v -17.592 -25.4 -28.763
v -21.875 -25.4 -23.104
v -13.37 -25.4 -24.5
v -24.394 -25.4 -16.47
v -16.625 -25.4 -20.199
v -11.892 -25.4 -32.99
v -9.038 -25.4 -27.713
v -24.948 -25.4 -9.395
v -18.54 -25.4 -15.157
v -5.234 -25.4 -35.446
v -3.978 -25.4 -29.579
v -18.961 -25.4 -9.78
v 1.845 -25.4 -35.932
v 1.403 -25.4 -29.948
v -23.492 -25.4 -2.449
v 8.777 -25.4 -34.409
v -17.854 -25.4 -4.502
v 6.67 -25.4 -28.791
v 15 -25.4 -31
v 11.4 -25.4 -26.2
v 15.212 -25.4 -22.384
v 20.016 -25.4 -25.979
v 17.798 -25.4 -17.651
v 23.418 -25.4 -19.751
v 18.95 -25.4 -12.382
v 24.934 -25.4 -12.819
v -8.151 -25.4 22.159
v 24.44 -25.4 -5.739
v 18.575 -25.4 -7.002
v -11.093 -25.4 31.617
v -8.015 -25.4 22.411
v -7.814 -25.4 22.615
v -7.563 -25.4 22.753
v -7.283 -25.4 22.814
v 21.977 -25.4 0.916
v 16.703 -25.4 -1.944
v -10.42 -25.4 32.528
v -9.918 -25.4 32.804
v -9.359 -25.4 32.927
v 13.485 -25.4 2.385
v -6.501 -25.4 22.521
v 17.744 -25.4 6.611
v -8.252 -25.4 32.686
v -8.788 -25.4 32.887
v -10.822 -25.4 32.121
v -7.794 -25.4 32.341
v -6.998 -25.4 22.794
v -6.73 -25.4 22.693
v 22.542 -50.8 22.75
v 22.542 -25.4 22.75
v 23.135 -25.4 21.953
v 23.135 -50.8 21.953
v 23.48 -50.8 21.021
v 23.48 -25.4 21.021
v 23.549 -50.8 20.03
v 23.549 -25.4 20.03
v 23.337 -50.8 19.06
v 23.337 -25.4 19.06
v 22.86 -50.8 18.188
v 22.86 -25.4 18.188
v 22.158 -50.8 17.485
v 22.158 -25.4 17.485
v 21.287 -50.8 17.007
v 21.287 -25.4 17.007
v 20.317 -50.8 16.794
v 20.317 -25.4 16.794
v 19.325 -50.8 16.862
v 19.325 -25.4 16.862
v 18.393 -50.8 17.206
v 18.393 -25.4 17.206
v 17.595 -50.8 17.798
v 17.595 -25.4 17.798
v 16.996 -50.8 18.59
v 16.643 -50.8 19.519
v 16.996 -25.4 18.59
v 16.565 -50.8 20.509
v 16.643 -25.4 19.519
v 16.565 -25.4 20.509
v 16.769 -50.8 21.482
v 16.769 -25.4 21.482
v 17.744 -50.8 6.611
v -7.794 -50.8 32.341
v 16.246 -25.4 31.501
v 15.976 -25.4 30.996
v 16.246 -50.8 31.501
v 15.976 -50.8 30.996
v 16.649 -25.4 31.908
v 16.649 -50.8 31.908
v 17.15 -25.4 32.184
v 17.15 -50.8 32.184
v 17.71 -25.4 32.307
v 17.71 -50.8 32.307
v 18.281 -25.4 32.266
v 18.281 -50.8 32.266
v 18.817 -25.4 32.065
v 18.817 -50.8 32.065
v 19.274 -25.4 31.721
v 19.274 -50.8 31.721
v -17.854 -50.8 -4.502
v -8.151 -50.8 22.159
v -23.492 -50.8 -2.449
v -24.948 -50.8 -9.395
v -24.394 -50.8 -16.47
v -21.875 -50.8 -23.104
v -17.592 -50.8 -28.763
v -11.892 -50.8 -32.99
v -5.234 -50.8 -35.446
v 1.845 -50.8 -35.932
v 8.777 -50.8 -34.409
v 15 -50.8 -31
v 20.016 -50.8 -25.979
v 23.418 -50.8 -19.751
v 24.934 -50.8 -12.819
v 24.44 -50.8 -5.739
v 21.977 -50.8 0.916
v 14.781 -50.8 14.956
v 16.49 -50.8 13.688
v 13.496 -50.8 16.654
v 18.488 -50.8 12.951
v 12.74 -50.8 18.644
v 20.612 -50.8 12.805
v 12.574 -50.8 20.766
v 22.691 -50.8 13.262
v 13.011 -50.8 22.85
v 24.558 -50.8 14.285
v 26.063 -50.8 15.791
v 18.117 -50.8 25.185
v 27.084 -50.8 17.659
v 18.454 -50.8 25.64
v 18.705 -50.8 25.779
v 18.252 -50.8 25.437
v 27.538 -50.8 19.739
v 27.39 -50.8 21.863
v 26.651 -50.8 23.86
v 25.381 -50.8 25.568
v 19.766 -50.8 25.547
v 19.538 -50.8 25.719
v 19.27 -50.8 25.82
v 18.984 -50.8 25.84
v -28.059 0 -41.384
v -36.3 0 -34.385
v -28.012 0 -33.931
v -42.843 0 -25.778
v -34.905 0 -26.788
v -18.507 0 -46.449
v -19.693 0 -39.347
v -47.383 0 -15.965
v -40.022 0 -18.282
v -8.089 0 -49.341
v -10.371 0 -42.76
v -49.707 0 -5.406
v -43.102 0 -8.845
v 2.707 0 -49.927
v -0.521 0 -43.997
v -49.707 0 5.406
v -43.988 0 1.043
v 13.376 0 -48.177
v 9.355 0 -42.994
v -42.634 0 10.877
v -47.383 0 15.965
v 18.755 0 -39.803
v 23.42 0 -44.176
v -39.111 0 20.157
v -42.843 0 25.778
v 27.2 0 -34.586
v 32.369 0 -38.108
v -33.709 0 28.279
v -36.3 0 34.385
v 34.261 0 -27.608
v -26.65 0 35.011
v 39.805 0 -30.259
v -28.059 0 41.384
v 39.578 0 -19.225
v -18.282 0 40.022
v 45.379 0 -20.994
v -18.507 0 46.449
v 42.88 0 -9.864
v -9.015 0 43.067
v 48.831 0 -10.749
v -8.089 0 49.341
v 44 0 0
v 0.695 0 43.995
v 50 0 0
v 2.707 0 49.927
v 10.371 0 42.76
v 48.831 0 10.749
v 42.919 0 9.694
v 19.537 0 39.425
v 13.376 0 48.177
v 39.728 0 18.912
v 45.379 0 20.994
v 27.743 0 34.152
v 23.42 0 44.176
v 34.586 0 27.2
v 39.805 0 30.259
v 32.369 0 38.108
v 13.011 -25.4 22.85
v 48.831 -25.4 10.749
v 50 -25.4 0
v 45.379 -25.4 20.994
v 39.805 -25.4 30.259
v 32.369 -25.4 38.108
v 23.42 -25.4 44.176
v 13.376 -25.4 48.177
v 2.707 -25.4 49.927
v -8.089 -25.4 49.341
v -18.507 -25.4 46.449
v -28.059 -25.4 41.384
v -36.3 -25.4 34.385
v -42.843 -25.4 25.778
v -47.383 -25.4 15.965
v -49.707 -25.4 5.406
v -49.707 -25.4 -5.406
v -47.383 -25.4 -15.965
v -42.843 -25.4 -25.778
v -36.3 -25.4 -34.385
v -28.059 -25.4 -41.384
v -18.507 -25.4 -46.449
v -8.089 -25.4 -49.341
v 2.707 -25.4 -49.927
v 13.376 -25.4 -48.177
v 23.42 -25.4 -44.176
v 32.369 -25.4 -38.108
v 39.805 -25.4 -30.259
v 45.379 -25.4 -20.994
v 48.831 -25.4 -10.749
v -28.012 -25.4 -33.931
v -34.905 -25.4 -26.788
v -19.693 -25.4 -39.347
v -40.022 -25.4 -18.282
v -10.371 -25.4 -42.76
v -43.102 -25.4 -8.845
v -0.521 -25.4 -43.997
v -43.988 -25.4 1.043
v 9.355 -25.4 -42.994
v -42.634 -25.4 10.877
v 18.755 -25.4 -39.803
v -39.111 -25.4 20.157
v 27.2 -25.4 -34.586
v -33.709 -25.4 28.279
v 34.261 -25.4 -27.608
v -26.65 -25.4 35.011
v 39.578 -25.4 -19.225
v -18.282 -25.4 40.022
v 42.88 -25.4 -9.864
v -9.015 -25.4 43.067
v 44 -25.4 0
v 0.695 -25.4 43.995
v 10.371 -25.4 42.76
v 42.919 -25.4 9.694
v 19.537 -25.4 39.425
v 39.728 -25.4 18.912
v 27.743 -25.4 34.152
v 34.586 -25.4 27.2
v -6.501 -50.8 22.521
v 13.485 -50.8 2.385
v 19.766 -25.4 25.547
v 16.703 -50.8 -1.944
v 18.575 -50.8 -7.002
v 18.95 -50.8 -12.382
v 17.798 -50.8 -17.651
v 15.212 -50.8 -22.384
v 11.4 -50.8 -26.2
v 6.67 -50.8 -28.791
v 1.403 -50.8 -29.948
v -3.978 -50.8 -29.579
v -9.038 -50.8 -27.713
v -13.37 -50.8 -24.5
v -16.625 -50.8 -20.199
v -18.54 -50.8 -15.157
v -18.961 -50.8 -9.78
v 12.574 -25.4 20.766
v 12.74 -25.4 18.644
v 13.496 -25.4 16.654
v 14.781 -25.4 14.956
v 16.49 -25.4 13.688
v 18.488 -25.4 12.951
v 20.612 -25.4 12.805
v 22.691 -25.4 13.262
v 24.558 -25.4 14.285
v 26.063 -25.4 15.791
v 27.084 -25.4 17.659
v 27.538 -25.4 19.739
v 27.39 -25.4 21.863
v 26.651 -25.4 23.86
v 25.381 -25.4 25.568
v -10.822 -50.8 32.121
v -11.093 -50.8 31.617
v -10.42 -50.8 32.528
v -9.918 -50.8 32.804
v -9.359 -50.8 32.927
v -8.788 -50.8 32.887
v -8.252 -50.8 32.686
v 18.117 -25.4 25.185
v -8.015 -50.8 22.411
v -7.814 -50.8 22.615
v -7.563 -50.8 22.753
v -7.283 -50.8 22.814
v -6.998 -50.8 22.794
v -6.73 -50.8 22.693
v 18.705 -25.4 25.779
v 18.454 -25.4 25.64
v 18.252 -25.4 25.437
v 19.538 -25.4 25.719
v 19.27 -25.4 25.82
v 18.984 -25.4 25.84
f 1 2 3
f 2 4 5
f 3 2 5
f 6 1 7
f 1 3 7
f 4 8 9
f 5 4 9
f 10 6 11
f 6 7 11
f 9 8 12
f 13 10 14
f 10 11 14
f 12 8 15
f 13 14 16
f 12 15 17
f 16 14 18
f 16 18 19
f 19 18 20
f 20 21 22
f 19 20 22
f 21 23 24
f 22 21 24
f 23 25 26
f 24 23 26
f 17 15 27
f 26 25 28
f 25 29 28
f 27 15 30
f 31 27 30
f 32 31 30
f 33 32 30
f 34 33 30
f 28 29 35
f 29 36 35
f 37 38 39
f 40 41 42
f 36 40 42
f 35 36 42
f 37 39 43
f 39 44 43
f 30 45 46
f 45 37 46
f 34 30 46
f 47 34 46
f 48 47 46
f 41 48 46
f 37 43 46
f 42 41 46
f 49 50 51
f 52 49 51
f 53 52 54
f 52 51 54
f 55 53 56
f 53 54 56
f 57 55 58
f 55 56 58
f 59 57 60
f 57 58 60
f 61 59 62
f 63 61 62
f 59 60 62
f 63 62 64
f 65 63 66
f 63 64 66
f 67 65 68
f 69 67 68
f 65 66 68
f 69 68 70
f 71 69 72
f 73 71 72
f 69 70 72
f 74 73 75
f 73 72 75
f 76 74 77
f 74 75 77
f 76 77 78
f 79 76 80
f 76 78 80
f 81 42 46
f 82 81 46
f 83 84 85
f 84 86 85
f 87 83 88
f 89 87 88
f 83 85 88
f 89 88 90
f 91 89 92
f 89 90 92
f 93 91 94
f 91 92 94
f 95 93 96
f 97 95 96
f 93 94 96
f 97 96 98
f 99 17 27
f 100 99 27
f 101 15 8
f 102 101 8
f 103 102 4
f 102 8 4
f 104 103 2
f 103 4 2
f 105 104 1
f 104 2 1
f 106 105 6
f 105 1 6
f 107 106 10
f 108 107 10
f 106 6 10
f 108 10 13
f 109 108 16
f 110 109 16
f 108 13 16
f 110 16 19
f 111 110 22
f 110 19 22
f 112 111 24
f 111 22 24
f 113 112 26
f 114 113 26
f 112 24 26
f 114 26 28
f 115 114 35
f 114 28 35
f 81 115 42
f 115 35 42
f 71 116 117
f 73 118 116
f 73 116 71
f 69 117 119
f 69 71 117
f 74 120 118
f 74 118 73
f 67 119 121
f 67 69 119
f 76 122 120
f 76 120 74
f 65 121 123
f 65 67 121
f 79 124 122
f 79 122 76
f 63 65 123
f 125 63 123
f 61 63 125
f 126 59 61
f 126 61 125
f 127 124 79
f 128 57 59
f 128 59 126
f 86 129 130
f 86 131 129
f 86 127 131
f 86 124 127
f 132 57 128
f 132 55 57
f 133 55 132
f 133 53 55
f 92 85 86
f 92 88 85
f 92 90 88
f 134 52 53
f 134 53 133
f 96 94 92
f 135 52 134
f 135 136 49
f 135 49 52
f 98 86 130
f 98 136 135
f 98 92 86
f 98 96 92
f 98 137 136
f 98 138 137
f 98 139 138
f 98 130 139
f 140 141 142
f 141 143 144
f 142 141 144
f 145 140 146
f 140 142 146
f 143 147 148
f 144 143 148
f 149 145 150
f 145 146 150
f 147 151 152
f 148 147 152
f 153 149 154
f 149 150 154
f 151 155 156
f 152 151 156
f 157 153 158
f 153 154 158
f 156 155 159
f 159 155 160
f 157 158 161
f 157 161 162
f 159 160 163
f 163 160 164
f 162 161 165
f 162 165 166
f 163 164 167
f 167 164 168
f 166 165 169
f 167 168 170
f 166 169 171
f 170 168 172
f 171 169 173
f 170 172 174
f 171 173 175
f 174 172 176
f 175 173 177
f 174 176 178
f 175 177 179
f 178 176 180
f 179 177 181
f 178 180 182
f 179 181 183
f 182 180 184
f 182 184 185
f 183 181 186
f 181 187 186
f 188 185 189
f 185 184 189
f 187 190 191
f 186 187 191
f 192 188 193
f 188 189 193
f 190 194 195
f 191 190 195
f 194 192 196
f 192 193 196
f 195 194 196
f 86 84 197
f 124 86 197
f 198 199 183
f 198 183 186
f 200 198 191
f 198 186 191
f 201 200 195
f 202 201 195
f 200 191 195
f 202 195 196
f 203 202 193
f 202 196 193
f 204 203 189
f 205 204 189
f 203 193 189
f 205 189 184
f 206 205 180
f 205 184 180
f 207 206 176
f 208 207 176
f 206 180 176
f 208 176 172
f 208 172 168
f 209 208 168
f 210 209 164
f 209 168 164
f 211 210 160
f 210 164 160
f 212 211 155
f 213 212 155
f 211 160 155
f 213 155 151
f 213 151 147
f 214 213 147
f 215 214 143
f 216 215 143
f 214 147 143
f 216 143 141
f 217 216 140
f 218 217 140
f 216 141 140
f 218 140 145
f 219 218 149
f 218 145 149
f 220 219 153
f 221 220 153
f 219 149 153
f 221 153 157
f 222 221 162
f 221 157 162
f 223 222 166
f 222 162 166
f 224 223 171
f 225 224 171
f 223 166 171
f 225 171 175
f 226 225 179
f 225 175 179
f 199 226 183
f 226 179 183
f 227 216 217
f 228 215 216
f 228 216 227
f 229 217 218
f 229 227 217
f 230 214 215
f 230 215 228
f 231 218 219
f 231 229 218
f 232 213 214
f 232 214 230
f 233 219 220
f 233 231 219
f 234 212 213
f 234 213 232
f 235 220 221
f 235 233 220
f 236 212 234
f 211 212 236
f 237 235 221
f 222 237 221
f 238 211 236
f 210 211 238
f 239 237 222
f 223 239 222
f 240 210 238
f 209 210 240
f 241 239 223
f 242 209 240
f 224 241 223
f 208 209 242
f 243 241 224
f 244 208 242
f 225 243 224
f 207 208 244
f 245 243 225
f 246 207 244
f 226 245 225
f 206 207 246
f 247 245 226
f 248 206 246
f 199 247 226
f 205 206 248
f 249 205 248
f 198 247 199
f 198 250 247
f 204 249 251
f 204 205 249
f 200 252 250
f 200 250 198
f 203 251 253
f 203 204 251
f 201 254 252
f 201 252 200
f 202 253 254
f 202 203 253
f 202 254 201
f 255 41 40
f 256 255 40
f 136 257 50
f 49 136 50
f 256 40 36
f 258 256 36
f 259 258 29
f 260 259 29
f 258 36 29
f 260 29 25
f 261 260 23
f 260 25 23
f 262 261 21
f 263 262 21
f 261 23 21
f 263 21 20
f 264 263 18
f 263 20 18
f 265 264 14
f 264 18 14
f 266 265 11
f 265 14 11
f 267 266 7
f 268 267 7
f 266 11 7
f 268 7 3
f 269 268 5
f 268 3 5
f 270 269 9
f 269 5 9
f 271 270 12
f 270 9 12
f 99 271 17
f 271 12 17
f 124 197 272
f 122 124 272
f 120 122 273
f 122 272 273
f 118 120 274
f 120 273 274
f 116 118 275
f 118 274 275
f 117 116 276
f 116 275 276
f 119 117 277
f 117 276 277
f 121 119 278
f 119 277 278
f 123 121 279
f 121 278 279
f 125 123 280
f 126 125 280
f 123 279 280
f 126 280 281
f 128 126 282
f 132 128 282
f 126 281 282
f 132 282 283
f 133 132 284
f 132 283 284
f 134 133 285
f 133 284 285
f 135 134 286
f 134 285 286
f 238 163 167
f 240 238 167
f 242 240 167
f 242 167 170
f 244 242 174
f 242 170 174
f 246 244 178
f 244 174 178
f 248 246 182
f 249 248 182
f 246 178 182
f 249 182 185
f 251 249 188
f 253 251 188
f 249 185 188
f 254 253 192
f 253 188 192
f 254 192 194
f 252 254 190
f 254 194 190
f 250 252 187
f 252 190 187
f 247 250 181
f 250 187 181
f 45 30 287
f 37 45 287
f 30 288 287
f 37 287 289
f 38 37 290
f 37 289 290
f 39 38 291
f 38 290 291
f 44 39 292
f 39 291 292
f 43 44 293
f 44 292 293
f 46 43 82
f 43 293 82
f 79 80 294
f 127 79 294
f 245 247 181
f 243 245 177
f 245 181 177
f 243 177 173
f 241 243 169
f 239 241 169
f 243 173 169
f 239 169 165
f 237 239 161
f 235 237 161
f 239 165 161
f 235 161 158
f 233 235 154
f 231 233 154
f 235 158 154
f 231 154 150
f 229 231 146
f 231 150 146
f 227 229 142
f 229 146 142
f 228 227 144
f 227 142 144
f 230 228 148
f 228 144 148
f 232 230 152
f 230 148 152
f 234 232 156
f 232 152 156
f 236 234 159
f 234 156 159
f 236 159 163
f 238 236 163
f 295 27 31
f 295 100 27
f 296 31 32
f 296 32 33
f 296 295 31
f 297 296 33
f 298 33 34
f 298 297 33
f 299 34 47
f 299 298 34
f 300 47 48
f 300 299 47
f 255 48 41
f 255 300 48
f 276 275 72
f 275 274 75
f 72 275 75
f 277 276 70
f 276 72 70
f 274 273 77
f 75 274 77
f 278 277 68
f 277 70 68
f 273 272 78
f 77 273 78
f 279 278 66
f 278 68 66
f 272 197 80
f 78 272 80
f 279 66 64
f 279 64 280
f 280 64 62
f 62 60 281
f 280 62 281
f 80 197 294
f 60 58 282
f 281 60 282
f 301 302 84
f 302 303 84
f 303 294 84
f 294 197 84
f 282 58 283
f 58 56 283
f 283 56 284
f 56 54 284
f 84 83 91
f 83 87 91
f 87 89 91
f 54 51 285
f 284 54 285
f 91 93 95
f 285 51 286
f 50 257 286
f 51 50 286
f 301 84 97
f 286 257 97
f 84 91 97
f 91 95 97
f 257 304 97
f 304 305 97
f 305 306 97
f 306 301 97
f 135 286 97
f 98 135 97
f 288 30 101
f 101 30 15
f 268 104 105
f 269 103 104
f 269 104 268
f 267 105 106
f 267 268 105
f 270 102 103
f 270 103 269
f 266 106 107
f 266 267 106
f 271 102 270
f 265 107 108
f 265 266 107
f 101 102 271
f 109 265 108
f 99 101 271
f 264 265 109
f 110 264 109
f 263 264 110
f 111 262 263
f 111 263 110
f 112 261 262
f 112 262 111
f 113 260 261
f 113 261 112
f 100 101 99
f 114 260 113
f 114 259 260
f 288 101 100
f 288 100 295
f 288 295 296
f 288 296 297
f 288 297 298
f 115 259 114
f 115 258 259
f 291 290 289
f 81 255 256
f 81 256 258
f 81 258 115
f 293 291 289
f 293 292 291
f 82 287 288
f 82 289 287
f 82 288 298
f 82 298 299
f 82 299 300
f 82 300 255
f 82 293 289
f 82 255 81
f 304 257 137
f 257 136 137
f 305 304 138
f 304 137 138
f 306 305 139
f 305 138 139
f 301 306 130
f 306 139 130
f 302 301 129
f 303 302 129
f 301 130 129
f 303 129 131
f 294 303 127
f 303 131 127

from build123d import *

# Parameters (mm, degrees)
F0_R      = 50
F1_DEPTH  = 25.4
F2_R      = 1
F3_R      = 2
F4_R      = 1
F5_R      = 2
F8_DEPTH  = 25.4
F9_R      = 1
F10_R     = 2
F11_R     = 4
F14_DEPTH = 25.4
F15_R     = 1
F15_2_R   = 1
F16_R     = 2
F16_2_R   = 2


with BuildPart() as f1:
    # F0 (on Front) → F1 (new body)
    with BuildSketch(Plane.XZ):
        Circle(F0_R)
        with BuildLine():
            ThreePointArc((-39.1111111111, 20.1574052808), (10.3708994574, 42.7603138955), (44, 0))
            ThreePointArc((44, 0), (-10.3708994574, -42.7603138955), (-39.1111111111, 20.1574052808))
        make_face(mode=Mode.SUBTRACT)
    extrude(amount=F1_DEPTH)


with BuildPart() as f1b:
    # F0 (on Front) → F1, piece 2 (new body)
    with BuildSketch(Plane.XZ):
        with BuildLine():
            ThreePointArc((0, 16.4924225025), (-16, 26.2462112512), (-32, 16.4924225025))
            Line((-32, 16.4924225025), (-30.2222222222, 15.5761768079))
            Line((-30.2222222222, 15.5761768079), (-34, 8.2462112512))
            ThreePointArc((-34, 8.2462112512), (-33.0849981905, 2.5802747153), (-30.4330181301, -2.5096238003))
            Line((-30.4330181301, -2.5096238003), (0, -43.3470204617))
            Line((0, -43.3470204617), (30.4330181301, -2.5096238003))
            ThreePointArc((30.4330181301, -2.5096238003), (25.5332732557, 23.5143709646), (0, 16.4924225025))
        make_face()
        with BuildLine():
            ThreePointArc((-28.829349449, -1.3145310168), (-31.9458736097, 6.9312531437), (-30.2222222222, 15.5761768079))
            ThreePointArc((-30.2222222222, 15.5761768079), (-12.2287638337, 23.7954163042), (0, 8.2462112512))
            ThreePointArc((0, 8.2462112512), (21.0363880319, 23.4328763095), (28.829349449, -1.3145310168))
            Line((28.829349449, -1.3145310168), (0, -40))
            Line((0, -40), (-28.829349449, -1.3145310168))
        make_face(mode=Mode.SUBTRACT)
        with BuildLine():
            Line((-30.2222222222, 15.5761768079), (-32, 16.4924225025))
            ThreePointArc((-32, 16.4924225025), (-33.4928556845, 12.4888519384), (-34, 8.2462112512))
            Line((-34, 8.2462112512), (-30.2222222222, 15.5761768079))
        make_face()
    extrude(amount=F1_DEPTH)

    # F2
    f2_edges = [f1b.edges().sort_by_distance(p)[0] for p in [
        (0, -12.7, 16.492423),
    ]]
    fillet(f2_edges, radius=F2_R)

    # F3
    f3_edges = [f1b.edges().sort_by_distance(p)[0] for p in [
        (0, -12.7, 8.246211),
    ]]
    fillet(f3_edges, radius=F3_R)

    # F4
    f4_edges = [f1b.edges().sort_by_distance(p)[0] for p in [
        (0, -12.7, -40),
    ]]
    fillet(f4_edges, radius=F4_R)

    # F5
    f5_edges = [f1b.edges().sort_by_distance(p)[0] for p in [
        (0, -12.7, -43.34702),
    ]]
    fillet(f5_edges, radius=F5_R)


with BuildPart() as f8:
    # F7 (on face) → F8 (new body)
    with BuildSketch(Plane.XZ.offset(25.4)):
        with BuildLine():
            ThreePointArc((9.5, 30.5), (0, 40), (-9.5, 30.5))
            Line((-9.5, 30.5), (-9.5, -8.9021278201))
            ThreePointArc((-9.5, -8.9021278201), (0, -40), (9.5, -8.9021278201))
            Line((9.5, -8.9021278201), (9.5, 30.5))
        make_face()
        with BuildLine():
            ThreePointArc((7.5, -10.0096189432), (0, -38), (-7.5, -10.0096189432))
            Line((-7.5, -10.0096189432), (-7.5, 30.5))
            ThreePointArc((-7.5, 30.5), (0, 38), (7.5, 30.5))
            Line((7.5, 30.5), (7.5, -10.0096189432))
        make_face(mode=Mode.SUBTRACT)
    extrude(amount=F8_DEPTH)

    # F9
    f9_edges = [f8.edges().sort_by_distance(p)[0] for p in [
        (9.5, -38.1, -8.902128),
        (-9.5, -38.1, -8.902128),
    ]]
    fillet(f9_edges, radius=F9_R)

    # F10
    f10_edges = [f8.edges().sort_by_distance(p)[0] for p in [
        (-7.5, -38.1, -10.009619),
        (7.5, -38.1, -10.009619),
    ]]
    fillet(f10_edges, radius=F10_R)


with BuildPart() as f8b:
    # F7 (on face) → F8, piece 2 (new body)
    with BuildSketch(Plane.XZ.offset(25.4)):
        Polygon((26.5, 22.5), (11.5, 15), (26.5, 7.5), align=None)
        Polygon((24.5, 10.7360679775), (15.972135955, 15), (24.5, 19.2639320225), align=None, mode=Mode.SUBTRACT)
    extrude(amount=F8_DEPTH)


with BuildPart() as f8c:
    # F7 (on face) → F8, piece 3 (new body)
    with BuildSketch(Plane.XZ.offset(25.4)):
        with BuildLine():
            Line((5.5, 15), (-5.5, 15))
            Line((-5.5, 15), (-5.5, -11.2207810106))
            ThreePointArc((-5.5, -11.2207810106), (0, -36), (5.5, -11.2207810106))
            Line((5.5, -11.2207810106), (5.5, 15))
        make_face()
    extrude(amount=F8_DEPTH)

    # F11
    f11_edges = [f8c.edges().sort_by_distance(p)[0] for p in [
        (-5.5, -38.1, -11.220781),
        (5.5, -38.1, -11.220781),
    ]]
    fillet(f11_edges, radius=F11_R)


with BuildPart() as f14:
    # F13 (on face) → F14 (new body)
    with BuildSketch(Plane.XZ.offset(25.4)):
        with BuildLine():
            Line((-10.0150942304, 34.5788647523), (-23.4923155196, -2.4494964169))
            ThreePointArc((-23.4923155196, -2.4494964169), (5.3652817168, -35.4174886526), (17.7437429675, 6.6113482023))
            Line((17.7437429675, 6.6113482023), (-10.0150942304, 34.5788647523))
        make_face()
        with BuildLine():
            Line((-7.6114716151, 23.6399372117), (13.4852446553, 2.3846246338))
            ThreePointArc((13.4852446553, 2.3846246338), (4.0776141047, -29.557291376), (-17.8541597949, -4.5016172768))
            Line((-17.8541597949, -4.5016172768), (-7.6114716151, 23.6399372117))
        make_face(mode=Mode.SUBTRACT)
    extrude(amount=F14_DEPTH)

    # F15
    f15_edges = [f14.edges().sort_by_distance(p)[0] for p in [
        (-7.611472, -38.1, 23.639937),
    ]]
    fillet(f15_edges, radius=F15_R)

    # F16
    f16_edges = [f14.edges().sort_by_distance(p)[0] for p in [
        (-10.015094, -38.1, 34.578865),
    ]]
    fillet(f16_edges, radius=F16_R)


with BuildPart() as f14b:
    # F13 (on face) → F14, piece 2 (new body)
    with BuildSketch(Plane.XZ.offset(25.4)):
        with BuildLine():
            Line((17.0536904288, 33.9583810385), (13.0105240421, 22.8498726878))
            ThreePointArc((13.0105240421, 22.8498726878), (21.667803213, 12.9594750171), (25.3813415882, 25.5681260735))
            Line((25.3813415882, 25.5681260735), (17.0536904288, 33.9583810385))
        make_face()
        with BuildLine():
            ThreePointArc((22.5423427134, 22.7503103612), (20.8093581383, 16.8662732015), (16.7692945252, 21.4817921145))
            Line((16.7692945252, 21.4817921145), (18.6561055057, 26.6657626782))
            Line((18.6561055057, 26.6657626782), (22.5423427134, 22.7503103612))
        make_face(mode=Mode.SUBTRACT)
    extrude(amount=F14_DEPTH)

    # F15#2
    f15_2_edges = [f14b.edges().sort_by_distance(p)[0] for p in [
        (18.656106, -38.1, 26.665763),
    ]]
    fillet(f15_2_edges, radius=F15_2_R)

    # F16#2
    f16_2_edges = [f14b.edges().sort_by_distance(p)[0] for p in [
        (17.05369, -38.1, 33.958381),
    ]]
    fillet(f16_2_edges, radius=F16_2_R)


solid = Compound([f1.part, f14.part, f14b.part])
